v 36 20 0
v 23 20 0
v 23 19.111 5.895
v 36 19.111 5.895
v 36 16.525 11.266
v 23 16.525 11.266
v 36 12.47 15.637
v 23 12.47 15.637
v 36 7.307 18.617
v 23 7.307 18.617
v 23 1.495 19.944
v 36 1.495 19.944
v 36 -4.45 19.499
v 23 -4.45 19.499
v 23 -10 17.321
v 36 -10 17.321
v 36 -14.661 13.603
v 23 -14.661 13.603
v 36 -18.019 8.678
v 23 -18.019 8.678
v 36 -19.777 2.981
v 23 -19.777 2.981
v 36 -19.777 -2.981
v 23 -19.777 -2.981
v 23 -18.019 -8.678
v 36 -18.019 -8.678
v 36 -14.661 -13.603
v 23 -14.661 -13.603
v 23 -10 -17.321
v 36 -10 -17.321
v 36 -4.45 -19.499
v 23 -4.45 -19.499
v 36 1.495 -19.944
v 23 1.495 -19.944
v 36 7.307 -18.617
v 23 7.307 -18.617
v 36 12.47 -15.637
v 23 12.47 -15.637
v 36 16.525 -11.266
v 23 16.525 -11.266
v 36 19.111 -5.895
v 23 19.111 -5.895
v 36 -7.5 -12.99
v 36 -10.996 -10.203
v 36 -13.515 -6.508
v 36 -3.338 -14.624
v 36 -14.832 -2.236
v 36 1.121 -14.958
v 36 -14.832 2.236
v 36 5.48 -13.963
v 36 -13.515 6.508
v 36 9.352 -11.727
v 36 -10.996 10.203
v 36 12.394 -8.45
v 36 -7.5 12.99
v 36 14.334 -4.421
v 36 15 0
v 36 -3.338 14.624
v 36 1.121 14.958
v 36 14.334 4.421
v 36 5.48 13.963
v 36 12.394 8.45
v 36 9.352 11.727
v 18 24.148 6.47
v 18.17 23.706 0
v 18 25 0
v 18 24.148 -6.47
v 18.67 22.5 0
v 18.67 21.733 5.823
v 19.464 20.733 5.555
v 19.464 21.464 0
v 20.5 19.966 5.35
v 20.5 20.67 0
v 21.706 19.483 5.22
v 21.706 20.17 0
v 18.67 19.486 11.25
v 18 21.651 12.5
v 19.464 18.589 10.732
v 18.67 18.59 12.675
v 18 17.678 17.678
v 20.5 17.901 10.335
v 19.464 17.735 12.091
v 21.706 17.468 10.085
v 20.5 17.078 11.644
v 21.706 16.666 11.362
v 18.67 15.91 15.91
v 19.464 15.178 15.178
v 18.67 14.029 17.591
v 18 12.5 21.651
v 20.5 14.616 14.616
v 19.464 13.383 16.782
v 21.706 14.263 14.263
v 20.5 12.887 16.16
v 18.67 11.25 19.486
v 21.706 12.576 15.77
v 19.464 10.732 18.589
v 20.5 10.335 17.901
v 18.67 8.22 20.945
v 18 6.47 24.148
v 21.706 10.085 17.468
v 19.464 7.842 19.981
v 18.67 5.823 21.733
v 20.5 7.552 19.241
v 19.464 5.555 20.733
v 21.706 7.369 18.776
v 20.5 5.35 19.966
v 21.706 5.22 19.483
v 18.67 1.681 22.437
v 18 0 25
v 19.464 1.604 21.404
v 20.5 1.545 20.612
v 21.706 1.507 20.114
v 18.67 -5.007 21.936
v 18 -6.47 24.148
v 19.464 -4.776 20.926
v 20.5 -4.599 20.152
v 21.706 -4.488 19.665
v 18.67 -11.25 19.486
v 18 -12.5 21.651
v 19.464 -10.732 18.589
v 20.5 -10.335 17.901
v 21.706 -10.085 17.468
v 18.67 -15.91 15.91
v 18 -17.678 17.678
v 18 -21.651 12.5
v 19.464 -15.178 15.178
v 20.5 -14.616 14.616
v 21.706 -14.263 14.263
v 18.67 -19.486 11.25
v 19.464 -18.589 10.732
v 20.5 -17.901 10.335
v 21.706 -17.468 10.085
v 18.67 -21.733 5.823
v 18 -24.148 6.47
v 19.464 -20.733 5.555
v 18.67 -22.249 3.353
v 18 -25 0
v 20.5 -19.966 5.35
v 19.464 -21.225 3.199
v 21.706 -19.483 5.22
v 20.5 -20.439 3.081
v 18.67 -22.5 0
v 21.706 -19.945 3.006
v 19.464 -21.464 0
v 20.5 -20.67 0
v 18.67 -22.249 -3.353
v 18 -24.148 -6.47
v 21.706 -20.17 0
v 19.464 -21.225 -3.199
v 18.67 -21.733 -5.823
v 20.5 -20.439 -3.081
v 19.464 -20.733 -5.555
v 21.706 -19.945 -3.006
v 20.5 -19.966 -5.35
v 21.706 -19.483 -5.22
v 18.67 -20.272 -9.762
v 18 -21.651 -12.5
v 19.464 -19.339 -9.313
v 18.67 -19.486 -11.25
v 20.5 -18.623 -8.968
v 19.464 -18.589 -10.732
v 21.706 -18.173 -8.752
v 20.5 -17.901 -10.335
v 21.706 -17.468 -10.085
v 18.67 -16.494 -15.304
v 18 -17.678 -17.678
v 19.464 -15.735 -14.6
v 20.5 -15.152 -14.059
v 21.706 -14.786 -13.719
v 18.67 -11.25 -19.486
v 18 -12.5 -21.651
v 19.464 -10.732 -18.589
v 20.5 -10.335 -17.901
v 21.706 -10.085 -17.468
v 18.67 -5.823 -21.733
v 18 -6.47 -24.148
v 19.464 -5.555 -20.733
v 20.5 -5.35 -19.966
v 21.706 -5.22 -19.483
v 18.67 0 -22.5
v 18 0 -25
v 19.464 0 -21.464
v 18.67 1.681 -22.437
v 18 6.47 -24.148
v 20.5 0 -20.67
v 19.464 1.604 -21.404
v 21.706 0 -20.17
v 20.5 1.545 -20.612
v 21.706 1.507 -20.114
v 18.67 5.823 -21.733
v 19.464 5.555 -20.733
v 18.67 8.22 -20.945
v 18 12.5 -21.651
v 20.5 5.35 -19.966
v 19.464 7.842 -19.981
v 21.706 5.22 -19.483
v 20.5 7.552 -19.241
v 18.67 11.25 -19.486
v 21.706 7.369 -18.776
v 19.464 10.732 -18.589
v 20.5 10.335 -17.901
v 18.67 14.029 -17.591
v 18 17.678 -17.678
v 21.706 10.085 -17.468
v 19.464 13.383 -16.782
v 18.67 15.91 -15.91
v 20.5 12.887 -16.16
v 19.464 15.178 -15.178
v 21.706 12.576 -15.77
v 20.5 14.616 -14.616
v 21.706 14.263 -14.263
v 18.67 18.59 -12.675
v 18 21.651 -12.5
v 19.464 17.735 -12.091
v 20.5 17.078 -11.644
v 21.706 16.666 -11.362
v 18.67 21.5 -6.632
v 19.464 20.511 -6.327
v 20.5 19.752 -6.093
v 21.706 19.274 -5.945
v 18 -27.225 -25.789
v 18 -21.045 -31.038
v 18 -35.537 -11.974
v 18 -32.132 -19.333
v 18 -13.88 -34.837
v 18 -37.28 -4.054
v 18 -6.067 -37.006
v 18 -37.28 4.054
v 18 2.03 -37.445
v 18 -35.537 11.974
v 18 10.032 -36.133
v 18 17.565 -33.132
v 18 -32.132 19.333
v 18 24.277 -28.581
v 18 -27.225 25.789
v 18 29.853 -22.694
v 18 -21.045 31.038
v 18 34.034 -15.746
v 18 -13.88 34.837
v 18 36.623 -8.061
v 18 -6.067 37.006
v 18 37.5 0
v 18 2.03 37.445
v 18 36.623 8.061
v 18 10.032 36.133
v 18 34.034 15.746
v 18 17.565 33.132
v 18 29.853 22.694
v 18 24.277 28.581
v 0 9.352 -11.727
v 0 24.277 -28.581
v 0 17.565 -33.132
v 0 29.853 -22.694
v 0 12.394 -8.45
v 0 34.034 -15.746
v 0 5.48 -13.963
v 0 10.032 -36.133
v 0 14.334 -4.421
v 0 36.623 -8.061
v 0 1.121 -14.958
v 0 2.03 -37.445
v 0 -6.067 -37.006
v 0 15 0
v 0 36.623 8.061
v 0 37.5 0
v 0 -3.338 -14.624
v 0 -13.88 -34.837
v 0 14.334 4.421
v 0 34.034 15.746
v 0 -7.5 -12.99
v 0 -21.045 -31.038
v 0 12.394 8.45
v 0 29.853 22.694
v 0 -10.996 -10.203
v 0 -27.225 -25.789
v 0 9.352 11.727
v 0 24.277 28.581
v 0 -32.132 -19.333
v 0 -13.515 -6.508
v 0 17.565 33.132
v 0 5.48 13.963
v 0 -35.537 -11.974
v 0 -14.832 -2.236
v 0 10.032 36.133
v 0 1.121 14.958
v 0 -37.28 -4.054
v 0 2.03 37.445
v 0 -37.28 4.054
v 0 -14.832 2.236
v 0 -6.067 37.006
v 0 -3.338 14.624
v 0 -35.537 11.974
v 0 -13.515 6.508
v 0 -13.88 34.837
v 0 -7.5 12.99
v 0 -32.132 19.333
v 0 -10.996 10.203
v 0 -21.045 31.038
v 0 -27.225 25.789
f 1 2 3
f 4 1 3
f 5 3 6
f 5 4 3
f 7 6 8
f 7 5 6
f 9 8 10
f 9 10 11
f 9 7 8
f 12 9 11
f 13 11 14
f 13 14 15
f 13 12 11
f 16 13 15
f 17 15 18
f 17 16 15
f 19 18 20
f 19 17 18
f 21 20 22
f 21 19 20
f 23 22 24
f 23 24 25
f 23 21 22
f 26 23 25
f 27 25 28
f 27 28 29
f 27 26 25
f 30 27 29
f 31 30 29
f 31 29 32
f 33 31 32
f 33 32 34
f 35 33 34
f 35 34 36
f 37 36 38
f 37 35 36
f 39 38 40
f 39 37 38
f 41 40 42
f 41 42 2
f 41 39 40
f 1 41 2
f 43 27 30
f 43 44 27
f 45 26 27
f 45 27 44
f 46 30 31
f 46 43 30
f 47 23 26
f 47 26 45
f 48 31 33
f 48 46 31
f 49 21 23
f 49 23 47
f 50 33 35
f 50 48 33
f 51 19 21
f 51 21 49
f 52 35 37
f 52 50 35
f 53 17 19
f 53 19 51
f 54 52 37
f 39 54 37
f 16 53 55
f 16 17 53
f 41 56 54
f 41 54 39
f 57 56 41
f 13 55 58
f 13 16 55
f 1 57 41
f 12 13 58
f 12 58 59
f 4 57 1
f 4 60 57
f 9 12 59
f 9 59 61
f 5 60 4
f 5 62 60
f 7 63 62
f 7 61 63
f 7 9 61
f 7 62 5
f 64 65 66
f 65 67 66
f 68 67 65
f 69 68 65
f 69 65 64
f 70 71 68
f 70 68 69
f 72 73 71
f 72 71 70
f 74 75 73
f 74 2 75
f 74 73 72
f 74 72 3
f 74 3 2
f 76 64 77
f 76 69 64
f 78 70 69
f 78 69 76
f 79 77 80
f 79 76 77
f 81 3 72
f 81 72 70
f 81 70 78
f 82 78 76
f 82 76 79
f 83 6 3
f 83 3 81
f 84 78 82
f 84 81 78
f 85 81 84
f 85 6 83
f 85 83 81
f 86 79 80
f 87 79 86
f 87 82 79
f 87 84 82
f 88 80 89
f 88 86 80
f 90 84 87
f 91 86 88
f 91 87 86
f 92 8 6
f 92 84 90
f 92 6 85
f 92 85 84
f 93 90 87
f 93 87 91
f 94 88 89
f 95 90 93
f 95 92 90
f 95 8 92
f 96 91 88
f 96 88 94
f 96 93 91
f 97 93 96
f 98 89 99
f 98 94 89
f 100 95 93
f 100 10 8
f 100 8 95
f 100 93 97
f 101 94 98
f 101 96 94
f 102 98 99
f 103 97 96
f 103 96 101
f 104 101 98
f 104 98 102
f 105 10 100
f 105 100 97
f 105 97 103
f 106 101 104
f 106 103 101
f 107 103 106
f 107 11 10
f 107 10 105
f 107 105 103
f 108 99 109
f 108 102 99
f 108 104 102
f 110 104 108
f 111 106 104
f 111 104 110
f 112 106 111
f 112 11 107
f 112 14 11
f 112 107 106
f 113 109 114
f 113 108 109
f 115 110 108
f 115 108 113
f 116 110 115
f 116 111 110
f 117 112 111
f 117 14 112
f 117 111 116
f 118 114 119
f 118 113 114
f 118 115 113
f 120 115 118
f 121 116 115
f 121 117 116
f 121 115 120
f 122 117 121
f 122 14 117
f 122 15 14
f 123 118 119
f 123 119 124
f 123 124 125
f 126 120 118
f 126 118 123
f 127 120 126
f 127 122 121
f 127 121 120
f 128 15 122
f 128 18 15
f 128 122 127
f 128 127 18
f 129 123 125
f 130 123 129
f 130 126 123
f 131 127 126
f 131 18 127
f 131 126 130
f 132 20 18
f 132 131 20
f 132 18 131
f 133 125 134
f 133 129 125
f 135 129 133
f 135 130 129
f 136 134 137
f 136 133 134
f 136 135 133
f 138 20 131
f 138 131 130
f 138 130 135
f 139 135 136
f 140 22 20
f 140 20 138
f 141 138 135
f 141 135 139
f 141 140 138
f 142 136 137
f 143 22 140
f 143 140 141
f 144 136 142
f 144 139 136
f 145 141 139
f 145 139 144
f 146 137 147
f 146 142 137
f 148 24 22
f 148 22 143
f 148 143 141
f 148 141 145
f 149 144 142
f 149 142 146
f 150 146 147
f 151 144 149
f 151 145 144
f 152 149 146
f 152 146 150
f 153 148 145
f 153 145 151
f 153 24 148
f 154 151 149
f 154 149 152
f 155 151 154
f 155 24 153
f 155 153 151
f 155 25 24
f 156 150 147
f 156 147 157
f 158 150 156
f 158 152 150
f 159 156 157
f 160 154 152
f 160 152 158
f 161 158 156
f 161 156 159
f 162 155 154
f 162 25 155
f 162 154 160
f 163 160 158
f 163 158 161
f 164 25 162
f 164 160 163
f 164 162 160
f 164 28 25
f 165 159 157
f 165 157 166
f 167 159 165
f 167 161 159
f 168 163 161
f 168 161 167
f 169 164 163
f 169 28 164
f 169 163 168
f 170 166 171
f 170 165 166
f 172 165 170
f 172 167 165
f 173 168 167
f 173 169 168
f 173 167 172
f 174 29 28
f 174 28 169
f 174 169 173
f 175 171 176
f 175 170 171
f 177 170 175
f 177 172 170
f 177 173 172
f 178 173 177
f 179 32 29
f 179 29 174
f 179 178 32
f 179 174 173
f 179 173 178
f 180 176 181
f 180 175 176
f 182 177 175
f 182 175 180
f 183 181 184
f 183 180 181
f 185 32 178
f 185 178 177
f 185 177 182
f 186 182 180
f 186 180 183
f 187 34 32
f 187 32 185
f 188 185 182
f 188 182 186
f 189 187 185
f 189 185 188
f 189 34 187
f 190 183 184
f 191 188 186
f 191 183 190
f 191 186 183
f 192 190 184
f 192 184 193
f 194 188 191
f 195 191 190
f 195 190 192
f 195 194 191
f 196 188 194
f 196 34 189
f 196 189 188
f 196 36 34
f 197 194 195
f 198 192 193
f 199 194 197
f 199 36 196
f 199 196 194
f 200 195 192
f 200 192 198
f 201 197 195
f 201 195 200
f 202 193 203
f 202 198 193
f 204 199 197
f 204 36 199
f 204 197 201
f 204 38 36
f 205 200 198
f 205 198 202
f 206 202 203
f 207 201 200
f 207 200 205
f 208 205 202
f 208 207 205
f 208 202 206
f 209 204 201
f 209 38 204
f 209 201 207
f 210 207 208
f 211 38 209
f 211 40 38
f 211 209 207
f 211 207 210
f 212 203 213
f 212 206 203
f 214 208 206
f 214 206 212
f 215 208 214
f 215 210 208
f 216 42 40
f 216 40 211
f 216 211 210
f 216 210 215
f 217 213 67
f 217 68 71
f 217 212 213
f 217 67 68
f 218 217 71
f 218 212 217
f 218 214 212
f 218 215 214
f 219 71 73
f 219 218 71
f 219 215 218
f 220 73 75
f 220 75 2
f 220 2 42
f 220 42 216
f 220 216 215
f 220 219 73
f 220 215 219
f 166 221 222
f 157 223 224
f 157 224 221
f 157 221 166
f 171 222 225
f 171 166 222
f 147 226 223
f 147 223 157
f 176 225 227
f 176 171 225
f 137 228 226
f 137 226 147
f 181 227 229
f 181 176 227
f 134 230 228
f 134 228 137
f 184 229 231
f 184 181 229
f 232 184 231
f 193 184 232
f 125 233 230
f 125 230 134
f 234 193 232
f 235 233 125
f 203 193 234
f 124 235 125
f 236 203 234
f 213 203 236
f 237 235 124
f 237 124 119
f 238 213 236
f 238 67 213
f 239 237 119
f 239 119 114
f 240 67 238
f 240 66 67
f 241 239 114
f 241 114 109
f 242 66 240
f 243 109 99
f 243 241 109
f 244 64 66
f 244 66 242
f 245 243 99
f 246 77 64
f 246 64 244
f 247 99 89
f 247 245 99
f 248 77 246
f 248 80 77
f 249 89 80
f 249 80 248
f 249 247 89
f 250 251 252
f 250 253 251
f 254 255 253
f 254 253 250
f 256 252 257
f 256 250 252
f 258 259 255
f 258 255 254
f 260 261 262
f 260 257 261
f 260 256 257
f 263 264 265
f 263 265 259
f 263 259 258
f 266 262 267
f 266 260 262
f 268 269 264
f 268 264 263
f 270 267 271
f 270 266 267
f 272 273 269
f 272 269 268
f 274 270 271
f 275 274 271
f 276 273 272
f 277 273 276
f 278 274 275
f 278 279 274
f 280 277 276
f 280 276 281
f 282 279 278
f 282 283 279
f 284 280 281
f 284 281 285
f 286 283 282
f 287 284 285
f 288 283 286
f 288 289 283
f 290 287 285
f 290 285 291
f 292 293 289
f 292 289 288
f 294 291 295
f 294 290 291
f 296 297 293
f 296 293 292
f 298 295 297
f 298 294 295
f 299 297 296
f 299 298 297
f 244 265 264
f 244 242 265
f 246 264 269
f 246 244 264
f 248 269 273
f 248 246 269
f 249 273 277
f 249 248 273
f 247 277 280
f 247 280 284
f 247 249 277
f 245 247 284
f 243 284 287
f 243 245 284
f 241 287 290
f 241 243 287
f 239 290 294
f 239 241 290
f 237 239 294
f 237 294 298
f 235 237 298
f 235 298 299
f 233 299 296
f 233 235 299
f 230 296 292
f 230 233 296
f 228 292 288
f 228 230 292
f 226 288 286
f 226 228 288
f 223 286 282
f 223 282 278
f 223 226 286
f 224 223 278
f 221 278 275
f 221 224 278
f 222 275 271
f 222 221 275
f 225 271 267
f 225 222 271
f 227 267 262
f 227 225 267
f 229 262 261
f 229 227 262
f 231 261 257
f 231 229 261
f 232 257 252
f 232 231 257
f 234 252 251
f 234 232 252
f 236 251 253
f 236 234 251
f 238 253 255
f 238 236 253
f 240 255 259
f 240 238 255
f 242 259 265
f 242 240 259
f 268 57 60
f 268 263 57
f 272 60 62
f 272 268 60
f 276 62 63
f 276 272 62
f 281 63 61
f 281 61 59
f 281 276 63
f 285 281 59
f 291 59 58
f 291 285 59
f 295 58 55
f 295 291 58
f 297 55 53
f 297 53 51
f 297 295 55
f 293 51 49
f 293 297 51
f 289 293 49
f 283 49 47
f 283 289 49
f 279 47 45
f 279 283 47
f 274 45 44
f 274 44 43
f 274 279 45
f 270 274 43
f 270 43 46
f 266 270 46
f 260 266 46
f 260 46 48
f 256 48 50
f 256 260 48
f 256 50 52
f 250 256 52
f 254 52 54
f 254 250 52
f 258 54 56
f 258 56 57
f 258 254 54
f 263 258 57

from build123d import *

# Parameters (mm, degrees)
RADYUS1_R = 5


with BuildPart() as part:
    # Çizim1 → Döndür1 (revolve)
    with BuildSketch(Plane.XY):
        Polygon((0, 37.5), (18, 37.5), (18, 20), (36, 20), (36, 15), (0, 15), align=None)
    revolve(axis=Axis((0, 0, 0), (1, 0, 0)))

    # Radyus1
    radyus1_edges = [part.edges().sort_by_distance(p)[0] for p in [
        (18, -20, 0),
    ]]
    fillet(radyus1_edges, radius=RADYUS1_R)


solid = part.part
